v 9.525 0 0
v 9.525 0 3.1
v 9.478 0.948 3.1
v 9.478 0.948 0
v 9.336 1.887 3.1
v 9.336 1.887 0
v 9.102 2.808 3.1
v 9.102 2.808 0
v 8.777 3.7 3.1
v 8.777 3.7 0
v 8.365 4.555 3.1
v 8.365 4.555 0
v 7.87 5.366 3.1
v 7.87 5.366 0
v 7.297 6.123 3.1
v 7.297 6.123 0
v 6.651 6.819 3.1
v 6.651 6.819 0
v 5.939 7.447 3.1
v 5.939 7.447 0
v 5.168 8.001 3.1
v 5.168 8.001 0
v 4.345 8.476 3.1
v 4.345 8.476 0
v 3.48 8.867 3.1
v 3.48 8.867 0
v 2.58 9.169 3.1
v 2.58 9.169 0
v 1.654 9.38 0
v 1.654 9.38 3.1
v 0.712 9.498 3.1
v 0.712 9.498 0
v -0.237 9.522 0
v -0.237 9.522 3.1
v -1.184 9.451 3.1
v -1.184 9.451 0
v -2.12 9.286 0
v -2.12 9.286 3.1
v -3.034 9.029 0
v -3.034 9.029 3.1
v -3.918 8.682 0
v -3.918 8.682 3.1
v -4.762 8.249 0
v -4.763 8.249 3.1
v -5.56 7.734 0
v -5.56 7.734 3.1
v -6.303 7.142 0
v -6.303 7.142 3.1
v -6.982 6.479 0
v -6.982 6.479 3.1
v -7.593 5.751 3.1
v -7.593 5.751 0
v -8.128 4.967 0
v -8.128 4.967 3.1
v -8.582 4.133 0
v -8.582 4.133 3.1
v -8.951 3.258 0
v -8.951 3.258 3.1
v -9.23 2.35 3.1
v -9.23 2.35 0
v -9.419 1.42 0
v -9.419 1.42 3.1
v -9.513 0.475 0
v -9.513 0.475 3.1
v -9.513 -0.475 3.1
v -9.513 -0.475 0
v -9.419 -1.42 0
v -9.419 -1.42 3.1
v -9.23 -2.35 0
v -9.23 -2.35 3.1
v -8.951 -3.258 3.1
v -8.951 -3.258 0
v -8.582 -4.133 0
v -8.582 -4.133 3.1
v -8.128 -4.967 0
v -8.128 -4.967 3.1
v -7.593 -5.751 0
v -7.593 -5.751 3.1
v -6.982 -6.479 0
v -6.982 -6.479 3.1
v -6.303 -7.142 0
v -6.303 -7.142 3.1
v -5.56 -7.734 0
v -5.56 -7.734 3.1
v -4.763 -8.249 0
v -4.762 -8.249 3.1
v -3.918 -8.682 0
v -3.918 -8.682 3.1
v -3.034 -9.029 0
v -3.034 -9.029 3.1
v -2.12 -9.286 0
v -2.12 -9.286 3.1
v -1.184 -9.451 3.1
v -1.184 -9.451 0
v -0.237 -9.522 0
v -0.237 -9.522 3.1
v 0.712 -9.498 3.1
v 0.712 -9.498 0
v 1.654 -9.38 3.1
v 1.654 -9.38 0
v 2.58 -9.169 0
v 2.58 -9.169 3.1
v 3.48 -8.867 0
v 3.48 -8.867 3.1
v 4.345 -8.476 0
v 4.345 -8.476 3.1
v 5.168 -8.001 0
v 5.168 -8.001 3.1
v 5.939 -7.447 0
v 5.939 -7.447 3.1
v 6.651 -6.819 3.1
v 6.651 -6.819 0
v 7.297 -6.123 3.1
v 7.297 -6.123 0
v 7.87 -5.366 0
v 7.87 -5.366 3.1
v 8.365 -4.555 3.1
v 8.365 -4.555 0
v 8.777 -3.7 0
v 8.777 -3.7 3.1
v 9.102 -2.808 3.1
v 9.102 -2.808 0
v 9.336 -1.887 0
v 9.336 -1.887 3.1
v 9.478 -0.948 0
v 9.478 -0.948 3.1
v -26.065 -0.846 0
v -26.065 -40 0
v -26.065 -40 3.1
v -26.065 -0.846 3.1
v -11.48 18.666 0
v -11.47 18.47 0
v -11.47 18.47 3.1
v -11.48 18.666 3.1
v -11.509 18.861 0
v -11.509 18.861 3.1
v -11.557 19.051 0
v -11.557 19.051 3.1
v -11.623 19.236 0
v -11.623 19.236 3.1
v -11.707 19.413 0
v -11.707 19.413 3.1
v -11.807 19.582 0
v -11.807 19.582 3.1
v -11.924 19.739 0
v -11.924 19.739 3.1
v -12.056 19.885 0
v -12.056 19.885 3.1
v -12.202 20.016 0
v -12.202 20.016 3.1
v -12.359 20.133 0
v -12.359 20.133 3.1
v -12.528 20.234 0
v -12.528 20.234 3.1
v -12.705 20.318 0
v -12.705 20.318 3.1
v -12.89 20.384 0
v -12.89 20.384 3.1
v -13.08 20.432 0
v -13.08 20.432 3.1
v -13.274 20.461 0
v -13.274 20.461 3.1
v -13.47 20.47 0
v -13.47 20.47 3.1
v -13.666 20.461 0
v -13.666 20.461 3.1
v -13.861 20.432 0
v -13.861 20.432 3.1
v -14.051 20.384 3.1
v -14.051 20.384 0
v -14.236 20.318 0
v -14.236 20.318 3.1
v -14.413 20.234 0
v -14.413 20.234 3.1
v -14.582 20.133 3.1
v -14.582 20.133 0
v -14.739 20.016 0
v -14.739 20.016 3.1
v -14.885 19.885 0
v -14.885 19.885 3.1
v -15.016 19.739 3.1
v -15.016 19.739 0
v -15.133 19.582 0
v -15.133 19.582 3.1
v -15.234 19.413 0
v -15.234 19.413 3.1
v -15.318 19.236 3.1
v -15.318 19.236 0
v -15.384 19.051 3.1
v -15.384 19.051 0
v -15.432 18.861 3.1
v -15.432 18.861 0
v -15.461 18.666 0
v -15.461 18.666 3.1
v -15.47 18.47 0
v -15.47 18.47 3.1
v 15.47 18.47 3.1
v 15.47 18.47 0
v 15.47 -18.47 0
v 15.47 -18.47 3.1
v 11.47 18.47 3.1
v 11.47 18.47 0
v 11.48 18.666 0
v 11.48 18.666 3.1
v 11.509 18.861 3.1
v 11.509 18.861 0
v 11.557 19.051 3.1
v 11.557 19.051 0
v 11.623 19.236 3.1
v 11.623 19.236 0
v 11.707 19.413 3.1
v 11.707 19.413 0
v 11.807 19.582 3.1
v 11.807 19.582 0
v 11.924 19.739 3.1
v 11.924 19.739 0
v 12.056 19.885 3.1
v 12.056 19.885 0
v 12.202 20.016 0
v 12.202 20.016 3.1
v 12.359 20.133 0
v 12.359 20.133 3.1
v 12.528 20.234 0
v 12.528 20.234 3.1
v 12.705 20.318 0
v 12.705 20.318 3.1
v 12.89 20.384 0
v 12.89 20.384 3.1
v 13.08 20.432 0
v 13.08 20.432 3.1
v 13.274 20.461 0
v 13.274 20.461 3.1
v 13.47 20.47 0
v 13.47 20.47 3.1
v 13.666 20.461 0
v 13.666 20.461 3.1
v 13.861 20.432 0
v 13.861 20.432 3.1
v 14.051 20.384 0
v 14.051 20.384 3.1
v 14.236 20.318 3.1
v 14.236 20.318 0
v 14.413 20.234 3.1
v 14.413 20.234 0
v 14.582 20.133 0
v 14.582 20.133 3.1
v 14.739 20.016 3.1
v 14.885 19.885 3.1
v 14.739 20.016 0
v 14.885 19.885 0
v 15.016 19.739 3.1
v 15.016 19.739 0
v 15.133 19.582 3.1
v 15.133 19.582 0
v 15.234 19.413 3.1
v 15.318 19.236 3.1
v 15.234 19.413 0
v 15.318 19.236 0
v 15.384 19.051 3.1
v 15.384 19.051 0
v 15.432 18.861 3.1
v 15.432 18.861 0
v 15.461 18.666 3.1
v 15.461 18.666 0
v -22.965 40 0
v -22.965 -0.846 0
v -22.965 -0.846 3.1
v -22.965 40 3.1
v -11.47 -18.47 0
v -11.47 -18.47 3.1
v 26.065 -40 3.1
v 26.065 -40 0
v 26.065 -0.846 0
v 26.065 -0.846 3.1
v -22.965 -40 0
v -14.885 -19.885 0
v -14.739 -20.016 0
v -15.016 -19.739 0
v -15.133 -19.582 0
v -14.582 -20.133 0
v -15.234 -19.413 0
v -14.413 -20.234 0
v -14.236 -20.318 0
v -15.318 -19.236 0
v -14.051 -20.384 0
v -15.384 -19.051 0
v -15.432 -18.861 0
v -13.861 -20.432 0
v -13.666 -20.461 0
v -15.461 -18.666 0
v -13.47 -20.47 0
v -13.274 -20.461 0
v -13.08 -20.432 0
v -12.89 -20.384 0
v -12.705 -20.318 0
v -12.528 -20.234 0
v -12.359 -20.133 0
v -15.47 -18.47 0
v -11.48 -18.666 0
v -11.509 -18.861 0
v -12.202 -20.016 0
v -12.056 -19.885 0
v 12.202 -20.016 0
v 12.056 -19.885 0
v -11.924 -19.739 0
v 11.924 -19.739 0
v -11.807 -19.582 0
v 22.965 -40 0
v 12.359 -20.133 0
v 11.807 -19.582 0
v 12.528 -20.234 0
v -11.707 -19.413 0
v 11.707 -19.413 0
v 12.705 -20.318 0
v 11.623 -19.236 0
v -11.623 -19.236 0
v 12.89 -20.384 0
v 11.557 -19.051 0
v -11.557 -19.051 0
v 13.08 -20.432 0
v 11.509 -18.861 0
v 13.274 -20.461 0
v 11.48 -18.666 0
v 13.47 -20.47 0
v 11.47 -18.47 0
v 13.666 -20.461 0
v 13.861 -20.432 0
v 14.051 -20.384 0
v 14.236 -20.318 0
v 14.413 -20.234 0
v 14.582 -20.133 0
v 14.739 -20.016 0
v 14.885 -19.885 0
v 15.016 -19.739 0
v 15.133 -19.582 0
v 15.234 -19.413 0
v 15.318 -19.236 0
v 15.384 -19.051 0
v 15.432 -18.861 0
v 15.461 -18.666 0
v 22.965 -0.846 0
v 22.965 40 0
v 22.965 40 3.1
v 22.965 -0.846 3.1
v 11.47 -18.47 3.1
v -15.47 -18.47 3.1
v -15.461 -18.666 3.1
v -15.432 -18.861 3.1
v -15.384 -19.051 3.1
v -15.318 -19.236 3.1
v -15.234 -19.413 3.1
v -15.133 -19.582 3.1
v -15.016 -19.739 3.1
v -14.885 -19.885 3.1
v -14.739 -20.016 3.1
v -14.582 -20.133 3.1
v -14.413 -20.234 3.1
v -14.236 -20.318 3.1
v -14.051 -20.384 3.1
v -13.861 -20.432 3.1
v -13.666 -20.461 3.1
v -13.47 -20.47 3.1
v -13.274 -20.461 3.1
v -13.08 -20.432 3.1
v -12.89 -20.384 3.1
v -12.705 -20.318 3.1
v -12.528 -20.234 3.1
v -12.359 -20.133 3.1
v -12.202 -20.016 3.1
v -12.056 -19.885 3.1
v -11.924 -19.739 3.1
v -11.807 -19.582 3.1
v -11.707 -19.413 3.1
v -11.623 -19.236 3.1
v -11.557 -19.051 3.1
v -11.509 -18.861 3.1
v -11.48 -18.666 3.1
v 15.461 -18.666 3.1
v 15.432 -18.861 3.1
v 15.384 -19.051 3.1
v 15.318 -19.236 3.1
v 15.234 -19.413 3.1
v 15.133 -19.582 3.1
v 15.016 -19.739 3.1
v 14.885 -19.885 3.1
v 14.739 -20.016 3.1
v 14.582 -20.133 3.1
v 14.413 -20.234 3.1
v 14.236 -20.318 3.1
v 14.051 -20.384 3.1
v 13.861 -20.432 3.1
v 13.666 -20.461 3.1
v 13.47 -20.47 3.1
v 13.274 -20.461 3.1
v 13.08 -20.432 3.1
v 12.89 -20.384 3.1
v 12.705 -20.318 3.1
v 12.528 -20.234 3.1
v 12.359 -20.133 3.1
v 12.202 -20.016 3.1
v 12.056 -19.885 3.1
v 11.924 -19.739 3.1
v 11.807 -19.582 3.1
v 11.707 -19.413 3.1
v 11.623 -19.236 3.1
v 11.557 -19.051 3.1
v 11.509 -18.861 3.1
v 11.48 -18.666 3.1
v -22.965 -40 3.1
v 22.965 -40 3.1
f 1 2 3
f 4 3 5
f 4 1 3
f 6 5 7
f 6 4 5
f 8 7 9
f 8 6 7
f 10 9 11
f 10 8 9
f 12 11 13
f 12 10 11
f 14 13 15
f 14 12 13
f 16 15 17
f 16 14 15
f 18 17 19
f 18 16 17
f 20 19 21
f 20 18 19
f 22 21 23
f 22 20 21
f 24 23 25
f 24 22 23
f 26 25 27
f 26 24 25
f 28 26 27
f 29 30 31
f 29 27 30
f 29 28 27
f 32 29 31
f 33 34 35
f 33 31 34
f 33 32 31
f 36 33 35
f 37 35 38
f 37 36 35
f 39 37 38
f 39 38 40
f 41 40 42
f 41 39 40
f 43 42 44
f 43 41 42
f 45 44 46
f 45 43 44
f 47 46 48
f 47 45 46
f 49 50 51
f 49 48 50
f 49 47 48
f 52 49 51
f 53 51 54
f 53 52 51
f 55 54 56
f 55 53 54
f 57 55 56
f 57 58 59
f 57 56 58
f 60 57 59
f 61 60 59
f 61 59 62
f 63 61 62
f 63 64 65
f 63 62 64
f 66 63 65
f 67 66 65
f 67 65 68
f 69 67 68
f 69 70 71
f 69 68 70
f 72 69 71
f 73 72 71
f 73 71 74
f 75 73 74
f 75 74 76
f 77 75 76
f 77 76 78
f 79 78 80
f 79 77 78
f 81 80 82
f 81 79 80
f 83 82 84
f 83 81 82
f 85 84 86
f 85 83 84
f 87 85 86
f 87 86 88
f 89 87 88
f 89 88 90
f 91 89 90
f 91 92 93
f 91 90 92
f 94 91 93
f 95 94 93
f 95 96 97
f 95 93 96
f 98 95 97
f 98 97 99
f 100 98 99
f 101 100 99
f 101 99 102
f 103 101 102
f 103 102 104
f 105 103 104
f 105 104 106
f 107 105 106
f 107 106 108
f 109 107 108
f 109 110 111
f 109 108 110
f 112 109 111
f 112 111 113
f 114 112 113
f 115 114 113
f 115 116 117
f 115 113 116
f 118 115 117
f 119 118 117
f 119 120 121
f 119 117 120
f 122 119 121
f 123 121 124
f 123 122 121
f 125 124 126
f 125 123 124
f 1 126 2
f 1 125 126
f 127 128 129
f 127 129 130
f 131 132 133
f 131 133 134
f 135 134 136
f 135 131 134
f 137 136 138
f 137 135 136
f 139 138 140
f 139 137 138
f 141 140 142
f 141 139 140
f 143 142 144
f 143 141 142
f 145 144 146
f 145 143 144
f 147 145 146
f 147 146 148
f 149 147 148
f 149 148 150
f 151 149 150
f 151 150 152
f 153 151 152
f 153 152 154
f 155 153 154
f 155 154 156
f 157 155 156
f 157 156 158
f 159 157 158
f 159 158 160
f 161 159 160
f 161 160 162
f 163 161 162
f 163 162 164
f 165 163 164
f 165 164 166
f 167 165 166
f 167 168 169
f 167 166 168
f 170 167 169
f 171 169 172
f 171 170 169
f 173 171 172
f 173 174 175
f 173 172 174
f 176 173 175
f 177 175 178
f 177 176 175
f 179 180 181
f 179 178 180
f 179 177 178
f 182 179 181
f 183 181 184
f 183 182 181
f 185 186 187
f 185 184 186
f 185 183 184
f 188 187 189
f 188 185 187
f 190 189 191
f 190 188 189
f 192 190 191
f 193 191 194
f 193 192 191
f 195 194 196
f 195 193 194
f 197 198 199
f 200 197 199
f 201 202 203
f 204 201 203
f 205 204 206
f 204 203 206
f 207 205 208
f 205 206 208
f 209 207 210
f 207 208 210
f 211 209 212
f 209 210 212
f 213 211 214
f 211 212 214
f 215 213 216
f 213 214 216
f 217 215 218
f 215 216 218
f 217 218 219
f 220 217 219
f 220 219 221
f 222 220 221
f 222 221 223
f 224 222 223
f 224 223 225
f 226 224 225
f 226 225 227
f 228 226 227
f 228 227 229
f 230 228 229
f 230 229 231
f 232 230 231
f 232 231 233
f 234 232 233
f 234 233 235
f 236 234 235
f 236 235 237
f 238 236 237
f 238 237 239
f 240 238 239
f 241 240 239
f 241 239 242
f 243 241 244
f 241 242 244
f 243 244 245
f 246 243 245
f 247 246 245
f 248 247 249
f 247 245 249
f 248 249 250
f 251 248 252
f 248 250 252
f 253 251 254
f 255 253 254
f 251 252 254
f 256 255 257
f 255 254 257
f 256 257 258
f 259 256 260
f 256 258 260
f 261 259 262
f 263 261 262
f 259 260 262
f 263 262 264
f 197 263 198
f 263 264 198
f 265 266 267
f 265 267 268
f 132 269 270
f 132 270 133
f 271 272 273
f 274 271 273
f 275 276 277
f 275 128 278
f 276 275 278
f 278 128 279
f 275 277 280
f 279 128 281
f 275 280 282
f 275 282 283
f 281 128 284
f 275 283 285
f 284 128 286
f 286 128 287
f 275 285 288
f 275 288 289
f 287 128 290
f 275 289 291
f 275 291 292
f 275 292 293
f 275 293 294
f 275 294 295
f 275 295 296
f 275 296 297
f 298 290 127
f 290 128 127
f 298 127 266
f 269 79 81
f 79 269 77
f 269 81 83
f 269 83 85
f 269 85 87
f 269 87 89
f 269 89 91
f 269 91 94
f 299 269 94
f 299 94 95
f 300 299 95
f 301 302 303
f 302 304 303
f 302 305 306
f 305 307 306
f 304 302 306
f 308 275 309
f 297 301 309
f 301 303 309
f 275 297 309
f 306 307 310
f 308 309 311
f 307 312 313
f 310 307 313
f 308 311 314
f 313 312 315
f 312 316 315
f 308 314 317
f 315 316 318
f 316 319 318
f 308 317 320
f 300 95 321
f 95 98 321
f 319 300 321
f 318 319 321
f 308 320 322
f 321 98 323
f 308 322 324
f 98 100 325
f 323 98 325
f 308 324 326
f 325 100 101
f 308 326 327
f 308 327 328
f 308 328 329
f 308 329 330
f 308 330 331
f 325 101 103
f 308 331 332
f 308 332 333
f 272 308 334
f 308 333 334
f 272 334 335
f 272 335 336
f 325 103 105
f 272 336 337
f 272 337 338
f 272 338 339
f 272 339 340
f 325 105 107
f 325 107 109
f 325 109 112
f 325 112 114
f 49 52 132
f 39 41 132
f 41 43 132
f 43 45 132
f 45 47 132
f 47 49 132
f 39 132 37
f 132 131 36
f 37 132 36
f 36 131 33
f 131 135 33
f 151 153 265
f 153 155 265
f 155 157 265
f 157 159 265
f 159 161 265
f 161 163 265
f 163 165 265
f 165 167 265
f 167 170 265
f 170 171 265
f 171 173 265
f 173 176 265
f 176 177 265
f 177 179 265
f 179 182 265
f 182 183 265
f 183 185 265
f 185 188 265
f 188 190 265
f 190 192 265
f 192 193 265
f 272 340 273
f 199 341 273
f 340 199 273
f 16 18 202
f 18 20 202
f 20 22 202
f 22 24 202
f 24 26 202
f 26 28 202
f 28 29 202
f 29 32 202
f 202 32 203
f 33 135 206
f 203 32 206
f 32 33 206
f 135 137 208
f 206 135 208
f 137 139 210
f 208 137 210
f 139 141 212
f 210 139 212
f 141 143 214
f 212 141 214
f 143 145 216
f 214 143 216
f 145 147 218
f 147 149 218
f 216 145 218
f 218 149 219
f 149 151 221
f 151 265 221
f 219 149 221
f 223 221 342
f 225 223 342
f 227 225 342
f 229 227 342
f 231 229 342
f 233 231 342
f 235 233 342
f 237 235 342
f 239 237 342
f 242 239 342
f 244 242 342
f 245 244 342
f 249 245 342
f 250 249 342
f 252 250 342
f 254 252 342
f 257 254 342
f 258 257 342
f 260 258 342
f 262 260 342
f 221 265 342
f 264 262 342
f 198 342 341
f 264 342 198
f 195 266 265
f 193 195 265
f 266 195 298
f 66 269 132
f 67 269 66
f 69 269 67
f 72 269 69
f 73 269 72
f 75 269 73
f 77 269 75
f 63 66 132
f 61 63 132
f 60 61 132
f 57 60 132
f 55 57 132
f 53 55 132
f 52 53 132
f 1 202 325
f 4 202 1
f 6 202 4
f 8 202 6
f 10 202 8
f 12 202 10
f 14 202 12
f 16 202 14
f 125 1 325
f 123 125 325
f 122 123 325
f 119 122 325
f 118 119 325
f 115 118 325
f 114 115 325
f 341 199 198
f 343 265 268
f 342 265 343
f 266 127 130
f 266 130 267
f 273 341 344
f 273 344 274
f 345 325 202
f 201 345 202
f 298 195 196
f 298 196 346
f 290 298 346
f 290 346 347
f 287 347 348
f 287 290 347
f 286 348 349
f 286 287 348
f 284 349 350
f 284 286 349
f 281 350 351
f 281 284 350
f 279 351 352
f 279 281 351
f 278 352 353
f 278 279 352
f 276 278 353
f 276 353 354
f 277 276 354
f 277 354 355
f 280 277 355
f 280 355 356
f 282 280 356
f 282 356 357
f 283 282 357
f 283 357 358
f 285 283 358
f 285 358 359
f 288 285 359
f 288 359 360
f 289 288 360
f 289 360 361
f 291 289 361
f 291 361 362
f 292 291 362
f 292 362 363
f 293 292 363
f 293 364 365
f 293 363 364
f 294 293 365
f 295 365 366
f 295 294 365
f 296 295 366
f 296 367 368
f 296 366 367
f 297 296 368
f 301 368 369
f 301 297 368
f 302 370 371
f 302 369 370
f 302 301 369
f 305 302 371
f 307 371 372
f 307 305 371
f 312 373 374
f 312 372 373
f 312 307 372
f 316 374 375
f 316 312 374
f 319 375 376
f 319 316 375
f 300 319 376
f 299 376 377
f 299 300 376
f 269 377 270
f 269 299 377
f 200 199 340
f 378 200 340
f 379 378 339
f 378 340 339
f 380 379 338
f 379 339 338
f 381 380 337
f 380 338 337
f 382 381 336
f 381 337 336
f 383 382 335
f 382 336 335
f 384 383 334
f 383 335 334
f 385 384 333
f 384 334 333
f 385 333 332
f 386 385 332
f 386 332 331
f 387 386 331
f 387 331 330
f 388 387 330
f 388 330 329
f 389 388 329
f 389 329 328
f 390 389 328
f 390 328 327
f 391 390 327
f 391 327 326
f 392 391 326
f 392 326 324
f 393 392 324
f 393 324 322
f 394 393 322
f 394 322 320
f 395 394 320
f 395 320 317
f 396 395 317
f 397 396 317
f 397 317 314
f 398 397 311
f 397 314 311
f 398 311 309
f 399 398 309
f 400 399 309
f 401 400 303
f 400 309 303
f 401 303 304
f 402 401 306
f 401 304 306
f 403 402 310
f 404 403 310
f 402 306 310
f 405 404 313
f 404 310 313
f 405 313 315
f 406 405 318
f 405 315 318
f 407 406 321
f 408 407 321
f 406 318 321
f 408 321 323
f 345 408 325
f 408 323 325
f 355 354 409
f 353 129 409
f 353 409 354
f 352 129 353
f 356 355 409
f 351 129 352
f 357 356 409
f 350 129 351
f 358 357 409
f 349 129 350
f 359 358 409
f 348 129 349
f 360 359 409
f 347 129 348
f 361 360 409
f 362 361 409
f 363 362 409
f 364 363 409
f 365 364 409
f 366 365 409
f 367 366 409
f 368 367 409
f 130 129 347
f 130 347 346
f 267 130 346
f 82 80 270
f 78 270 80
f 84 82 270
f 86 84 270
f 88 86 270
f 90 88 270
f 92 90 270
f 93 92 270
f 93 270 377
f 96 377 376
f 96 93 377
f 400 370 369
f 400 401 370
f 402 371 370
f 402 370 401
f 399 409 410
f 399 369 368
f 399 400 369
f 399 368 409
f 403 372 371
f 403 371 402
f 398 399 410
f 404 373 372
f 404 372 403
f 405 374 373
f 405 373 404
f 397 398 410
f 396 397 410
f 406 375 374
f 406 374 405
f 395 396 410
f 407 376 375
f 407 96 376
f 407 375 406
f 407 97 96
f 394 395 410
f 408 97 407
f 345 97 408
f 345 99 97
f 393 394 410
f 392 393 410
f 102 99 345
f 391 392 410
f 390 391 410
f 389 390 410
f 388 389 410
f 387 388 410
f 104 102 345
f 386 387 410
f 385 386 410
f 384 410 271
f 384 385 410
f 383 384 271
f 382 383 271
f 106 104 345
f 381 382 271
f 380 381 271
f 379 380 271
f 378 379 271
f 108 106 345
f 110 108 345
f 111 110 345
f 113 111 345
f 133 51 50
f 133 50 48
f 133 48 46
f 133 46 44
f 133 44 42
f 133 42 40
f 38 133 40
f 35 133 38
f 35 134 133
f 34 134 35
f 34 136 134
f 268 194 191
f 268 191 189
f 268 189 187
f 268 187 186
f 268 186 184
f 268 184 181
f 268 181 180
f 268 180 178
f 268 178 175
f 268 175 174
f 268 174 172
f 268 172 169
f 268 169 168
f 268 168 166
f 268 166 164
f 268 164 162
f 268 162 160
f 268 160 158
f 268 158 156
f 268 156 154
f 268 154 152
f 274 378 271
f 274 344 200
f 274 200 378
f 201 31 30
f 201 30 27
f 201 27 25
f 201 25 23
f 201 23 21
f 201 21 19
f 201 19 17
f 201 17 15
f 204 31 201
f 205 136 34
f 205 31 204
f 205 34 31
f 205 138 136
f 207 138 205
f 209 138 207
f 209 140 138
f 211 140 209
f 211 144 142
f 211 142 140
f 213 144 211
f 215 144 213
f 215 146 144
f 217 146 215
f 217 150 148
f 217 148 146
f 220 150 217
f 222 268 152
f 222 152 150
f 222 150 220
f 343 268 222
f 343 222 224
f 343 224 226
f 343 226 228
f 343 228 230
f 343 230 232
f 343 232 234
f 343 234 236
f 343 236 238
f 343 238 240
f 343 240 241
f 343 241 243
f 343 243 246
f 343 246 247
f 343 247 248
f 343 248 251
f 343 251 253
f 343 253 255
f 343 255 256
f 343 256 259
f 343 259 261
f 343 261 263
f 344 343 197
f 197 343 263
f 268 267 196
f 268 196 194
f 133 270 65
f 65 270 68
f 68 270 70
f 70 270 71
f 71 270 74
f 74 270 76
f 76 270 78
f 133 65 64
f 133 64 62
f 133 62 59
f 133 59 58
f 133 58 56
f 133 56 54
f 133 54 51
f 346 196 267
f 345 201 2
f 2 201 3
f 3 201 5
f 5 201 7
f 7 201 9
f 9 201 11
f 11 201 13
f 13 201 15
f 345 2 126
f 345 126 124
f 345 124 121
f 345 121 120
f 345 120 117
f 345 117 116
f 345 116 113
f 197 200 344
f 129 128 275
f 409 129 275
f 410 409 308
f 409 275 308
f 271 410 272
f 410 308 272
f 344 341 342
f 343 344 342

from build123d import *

# Parameters (mm, degrees)
SKETCH5_W           = 45.93
SKETCH5_H           = 80
BOSS_EXTRUDE5_DEPTH = 3.1
SKETCH6_W           = 3.1
SKETCH6_H           = 39.153821237
BOSS_EXTRUDE6_DEPTH = 3.1
SKETCH7_R           = 9.525
CUT_EXTRUDE2_DEPTH  = 4.1


with BuildPart() as part:
    # Sketch5 → Boss-Extrude5 (new body)
    with BuildSketch(Plane.XY):
        Rectangle(SKETCH5_W, SKETCH5_H)
    extrude(amount=BOSS_EXTRUDE5_DEPTH)

    # Sketch6 → Boss-Extrude6 (add, through all)
    with BuildSketch(Plane.XY):
        with Locations((24.515, -20.423089381)):
            Rectangle(SKETCH6_W, SKETCH6_H)
        with Locations((-24.515, -20.423089381)):
            Rectangle(SKETCH6_W, SKETCH6_H)
    extrude(amount=BOSS_EXTRUDE6_DEPTH)

    # Sketch7 → Cut-Extrude2 (cut, through all)
    with BuildSketch(Plane.XY):
        Circle(SKETCH7_R)
        with BuildLine():
            Line((-15.470384182, 13.470384182), (-15.470384182, -13.470384182))
            Line((-15.470384182, -13.470384182), (-15.470384182, -18.470384182))
            ThreePointArc((-15.470384182, -18.470384182), (-13.470384182, -20.470384182), (-11.470384182, -18.470384182))
            Line((-11.470384182, -18.470384182), (-11.470384182, -13.470384182))
            Line((-11.470384182, -13.470384182), (-11.470384182, 13.470384182))
            Line((-11.470384182, 13.470384182), (-11.470384182, 18.470384182))
            ThreePointArc((-11.470384182, 18.470384182), (-13.470384182, 20.470384182), (-15.470384182, 18.470384182))
            Line((-15.470384182, 18.470384182), (-15.470384182, 13.470384182))
        make_face()
        with BuildLine():
            Line((11.470384182, 13.470384182), (11.470384182, 18.470384182))
            ThreePointArc((11.470384182, 18.470384182), (13.470384182, 20.470384182), (15.470384182, 18.470384182))
            Line((15.470384182, 18.470384182), (15.470384182, 13.470384182))
            Line((15.470384182, 13.470384182), (15.470384182, -13.470384182))
            Line((15.470384182, -13.470384182), (15.470384182, -18.470384182))
            ThreePointArc((15.470384182, -18.470384182), (13.470384182, -20.470384182), (11.470384182, -18.470384182))
            Line((11.470384182, -18.470384182), (11.470384182, -13.470384182))
            Line((11.470384182, -13.470384182), (11.470384182, 13.470384182))
        make_face()
    extrude(amount=CUT_EXTRUDE2_DEPTH, mode=Mode.SUBTRACT)


solid = part.part
